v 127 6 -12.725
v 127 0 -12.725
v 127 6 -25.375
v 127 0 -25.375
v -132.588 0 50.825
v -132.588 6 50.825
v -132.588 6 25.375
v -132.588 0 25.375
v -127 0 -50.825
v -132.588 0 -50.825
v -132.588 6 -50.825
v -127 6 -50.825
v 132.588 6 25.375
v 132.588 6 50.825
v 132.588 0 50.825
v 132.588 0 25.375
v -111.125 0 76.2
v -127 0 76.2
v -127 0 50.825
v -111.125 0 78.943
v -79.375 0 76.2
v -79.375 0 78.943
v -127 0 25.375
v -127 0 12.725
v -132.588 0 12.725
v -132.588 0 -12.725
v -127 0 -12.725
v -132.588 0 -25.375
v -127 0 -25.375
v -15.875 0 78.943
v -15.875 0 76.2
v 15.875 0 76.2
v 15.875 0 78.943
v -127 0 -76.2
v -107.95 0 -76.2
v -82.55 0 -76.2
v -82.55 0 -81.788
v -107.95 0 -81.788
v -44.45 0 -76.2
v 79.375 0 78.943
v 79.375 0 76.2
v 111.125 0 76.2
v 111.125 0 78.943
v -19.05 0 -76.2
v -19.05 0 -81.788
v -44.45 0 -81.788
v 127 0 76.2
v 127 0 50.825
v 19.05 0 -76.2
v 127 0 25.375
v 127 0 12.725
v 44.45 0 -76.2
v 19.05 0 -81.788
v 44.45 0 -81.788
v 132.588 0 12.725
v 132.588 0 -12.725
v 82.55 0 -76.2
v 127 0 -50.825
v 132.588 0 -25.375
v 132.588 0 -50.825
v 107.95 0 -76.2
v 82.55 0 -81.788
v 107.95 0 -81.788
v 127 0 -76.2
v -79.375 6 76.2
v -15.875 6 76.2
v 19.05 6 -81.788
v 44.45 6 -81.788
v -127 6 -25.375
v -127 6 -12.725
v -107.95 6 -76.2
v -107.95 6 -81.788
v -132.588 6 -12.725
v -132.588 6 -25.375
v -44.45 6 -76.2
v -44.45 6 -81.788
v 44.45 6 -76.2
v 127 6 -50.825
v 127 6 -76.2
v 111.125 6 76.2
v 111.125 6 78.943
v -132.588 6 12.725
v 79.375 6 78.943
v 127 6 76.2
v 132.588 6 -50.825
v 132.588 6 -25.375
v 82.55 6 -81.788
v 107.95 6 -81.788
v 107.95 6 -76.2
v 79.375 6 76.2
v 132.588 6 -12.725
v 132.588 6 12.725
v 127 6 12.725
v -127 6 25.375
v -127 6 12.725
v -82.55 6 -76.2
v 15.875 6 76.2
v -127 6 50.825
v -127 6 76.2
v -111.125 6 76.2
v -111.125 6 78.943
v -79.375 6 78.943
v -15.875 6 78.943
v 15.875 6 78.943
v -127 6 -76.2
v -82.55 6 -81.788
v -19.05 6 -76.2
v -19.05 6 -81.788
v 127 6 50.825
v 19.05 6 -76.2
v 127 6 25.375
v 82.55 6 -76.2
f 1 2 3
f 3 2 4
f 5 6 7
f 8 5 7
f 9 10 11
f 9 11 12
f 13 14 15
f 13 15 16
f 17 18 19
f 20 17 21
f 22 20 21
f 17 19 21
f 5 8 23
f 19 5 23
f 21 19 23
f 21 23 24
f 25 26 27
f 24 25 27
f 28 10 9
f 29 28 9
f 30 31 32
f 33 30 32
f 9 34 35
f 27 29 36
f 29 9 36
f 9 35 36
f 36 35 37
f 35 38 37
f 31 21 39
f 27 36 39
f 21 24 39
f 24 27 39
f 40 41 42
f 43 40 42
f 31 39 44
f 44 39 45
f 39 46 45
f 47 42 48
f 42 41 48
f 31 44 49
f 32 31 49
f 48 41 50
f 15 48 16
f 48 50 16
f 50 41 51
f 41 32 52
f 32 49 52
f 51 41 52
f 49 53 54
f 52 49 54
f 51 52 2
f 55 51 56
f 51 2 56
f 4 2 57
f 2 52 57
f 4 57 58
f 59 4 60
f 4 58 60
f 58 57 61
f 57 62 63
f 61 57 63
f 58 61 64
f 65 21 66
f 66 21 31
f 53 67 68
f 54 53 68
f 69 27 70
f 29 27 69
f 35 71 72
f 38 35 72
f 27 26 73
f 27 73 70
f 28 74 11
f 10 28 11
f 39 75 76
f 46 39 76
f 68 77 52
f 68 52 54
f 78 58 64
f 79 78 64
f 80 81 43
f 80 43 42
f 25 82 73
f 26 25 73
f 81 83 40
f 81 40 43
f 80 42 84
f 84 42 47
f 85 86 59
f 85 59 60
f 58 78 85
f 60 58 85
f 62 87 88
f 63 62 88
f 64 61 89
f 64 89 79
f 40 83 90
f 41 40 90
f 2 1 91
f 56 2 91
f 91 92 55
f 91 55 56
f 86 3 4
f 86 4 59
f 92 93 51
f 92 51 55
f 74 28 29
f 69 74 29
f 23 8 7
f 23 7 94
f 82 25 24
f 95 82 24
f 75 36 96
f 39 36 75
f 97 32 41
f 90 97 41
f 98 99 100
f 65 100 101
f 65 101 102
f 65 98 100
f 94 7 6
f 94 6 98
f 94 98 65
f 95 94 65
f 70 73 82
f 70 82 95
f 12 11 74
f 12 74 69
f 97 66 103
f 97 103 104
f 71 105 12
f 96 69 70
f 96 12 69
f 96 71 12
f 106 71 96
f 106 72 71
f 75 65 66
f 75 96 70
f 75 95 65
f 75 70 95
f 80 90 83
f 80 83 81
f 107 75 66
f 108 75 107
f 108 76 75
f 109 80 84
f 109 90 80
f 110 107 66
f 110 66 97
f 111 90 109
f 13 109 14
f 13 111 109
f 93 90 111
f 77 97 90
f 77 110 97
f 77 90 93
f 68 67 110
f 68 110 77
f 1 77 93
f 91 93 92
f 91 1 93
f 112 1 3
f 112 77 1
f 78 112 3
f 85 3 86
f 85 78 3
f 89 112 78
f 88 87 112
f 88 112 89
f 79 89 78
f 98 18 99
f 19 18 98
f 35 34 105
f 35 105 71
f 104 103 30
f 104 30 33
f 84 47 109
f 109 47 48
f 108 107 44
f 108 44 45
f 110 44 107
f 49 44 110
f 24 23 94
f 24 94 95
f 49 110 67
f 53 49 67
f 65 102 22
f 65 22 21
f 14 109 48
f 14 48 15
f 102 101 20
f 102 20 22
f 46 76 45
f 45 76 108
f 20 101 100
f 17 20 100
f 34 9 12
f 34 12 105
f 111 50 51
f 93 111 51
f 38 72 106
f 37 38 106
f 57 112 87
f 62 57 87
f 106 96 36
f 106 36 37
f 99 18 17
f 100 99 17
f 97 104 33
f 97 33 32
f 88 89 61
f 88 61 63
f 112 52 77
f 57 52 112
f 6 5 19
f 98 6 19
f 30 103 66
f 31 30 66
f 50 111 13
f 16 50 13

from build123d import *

# Parameters (mm, degrees)
SKETCH1_W             = 254
SKETCH1_H             = 152.4
BOSS_EXTRUDE1_DEPTH   = 6
SKETCH2_W             = 25.4
SKETCH2_H             = 5.588
SKETCH2_W_2           = 31.75
SKETCH2_H_2           = 2.7432
TABS_TOP_BOTTOM_DEPTH = 6
SKETCH3_W             = 5.588
SKETCH3_H             = 25.4508
TABS_SIDE_DEPTH       = 6


with BuildPart() as part:
    # Sketch1 → Boss-Extrude1 (new body)
    with BuildSketch(Plane(origin=(0, 0, 0), x_dir=(1, 0, 0), z_dir=(0, 1, 0))):
        Rectangle(SKETCH1_W, SKETCH1_H)
    extrude(amount=BOSS_EXTRUDE1_DEPTH)

    # Sketch2 → Tabs - Top/Bottom (add)
    with BuildSketch(Plane(origin=(0, 6, 0), x_dir=(1, 0, 0), z_dir=(0, 1, 0))):
        with Locations((95.25, 78.994)):
            Rectangle(SKETCH2_W, SKETCH2_H)
        with Locations((-95.25, 78.994)):
            Rectangle(SKETCH2_W, SKETCH2_H)
        with Locations((-31.75, 78.994)):
            Rectangle(SKETCH2_W, SKETCH2_H)
        with Locations((31.75, 78.994)):
            Rectangle(SKETCH2_W, SKETCH2_H)
        with Locations((-95.25, -77.5716)):
            Rectangle(SKETCH2_W_2, SKETCH2_H_2)
        with Locations((0, -77.5716)):
            Rectangle(SKETCH2_W_2, SKETCH2_H_2)
        with Locations((95.25, -77.5716)):
            Rectangle(SKETCH2_W_2, SKETCH2_H_2)
    extrude(amount=-TABS_TOP_BOTTOM_DEPTH)

    # Sketch3 → Tabs - Side (add)
    with BuildSketch(Plane(origin=(0, 6, 0), x_dir=(1, 0, 0), z_dir=(0, 1, 0))):
        with Locations((-129.794, -38.1)):
            Rectangle(SKETCH3_W, SKETCH3_H)
        with Locations((-129.794, 0)):
            Rectangle(SKETCH3_W, SKETCH3_H)
        with Locations((-129.794, 38.1)):
            Rectangle(SKETCH3_W, SKETCH3_H)
        with Locations((129.794, -38.1)):
            Rectangle(SKETCH3_W, SKETCH3_H)
        with Locations((129.794, 38.1)):
            Rectangle(SKETCH3_W, SKETCH3_H)
        with Locations((129.794, 0)):
            Rectangle(SKETCH3_W, SKETCH3_H)
    extrude(amount=-TABS_SIDE_DEPTH)


solid = part.part
